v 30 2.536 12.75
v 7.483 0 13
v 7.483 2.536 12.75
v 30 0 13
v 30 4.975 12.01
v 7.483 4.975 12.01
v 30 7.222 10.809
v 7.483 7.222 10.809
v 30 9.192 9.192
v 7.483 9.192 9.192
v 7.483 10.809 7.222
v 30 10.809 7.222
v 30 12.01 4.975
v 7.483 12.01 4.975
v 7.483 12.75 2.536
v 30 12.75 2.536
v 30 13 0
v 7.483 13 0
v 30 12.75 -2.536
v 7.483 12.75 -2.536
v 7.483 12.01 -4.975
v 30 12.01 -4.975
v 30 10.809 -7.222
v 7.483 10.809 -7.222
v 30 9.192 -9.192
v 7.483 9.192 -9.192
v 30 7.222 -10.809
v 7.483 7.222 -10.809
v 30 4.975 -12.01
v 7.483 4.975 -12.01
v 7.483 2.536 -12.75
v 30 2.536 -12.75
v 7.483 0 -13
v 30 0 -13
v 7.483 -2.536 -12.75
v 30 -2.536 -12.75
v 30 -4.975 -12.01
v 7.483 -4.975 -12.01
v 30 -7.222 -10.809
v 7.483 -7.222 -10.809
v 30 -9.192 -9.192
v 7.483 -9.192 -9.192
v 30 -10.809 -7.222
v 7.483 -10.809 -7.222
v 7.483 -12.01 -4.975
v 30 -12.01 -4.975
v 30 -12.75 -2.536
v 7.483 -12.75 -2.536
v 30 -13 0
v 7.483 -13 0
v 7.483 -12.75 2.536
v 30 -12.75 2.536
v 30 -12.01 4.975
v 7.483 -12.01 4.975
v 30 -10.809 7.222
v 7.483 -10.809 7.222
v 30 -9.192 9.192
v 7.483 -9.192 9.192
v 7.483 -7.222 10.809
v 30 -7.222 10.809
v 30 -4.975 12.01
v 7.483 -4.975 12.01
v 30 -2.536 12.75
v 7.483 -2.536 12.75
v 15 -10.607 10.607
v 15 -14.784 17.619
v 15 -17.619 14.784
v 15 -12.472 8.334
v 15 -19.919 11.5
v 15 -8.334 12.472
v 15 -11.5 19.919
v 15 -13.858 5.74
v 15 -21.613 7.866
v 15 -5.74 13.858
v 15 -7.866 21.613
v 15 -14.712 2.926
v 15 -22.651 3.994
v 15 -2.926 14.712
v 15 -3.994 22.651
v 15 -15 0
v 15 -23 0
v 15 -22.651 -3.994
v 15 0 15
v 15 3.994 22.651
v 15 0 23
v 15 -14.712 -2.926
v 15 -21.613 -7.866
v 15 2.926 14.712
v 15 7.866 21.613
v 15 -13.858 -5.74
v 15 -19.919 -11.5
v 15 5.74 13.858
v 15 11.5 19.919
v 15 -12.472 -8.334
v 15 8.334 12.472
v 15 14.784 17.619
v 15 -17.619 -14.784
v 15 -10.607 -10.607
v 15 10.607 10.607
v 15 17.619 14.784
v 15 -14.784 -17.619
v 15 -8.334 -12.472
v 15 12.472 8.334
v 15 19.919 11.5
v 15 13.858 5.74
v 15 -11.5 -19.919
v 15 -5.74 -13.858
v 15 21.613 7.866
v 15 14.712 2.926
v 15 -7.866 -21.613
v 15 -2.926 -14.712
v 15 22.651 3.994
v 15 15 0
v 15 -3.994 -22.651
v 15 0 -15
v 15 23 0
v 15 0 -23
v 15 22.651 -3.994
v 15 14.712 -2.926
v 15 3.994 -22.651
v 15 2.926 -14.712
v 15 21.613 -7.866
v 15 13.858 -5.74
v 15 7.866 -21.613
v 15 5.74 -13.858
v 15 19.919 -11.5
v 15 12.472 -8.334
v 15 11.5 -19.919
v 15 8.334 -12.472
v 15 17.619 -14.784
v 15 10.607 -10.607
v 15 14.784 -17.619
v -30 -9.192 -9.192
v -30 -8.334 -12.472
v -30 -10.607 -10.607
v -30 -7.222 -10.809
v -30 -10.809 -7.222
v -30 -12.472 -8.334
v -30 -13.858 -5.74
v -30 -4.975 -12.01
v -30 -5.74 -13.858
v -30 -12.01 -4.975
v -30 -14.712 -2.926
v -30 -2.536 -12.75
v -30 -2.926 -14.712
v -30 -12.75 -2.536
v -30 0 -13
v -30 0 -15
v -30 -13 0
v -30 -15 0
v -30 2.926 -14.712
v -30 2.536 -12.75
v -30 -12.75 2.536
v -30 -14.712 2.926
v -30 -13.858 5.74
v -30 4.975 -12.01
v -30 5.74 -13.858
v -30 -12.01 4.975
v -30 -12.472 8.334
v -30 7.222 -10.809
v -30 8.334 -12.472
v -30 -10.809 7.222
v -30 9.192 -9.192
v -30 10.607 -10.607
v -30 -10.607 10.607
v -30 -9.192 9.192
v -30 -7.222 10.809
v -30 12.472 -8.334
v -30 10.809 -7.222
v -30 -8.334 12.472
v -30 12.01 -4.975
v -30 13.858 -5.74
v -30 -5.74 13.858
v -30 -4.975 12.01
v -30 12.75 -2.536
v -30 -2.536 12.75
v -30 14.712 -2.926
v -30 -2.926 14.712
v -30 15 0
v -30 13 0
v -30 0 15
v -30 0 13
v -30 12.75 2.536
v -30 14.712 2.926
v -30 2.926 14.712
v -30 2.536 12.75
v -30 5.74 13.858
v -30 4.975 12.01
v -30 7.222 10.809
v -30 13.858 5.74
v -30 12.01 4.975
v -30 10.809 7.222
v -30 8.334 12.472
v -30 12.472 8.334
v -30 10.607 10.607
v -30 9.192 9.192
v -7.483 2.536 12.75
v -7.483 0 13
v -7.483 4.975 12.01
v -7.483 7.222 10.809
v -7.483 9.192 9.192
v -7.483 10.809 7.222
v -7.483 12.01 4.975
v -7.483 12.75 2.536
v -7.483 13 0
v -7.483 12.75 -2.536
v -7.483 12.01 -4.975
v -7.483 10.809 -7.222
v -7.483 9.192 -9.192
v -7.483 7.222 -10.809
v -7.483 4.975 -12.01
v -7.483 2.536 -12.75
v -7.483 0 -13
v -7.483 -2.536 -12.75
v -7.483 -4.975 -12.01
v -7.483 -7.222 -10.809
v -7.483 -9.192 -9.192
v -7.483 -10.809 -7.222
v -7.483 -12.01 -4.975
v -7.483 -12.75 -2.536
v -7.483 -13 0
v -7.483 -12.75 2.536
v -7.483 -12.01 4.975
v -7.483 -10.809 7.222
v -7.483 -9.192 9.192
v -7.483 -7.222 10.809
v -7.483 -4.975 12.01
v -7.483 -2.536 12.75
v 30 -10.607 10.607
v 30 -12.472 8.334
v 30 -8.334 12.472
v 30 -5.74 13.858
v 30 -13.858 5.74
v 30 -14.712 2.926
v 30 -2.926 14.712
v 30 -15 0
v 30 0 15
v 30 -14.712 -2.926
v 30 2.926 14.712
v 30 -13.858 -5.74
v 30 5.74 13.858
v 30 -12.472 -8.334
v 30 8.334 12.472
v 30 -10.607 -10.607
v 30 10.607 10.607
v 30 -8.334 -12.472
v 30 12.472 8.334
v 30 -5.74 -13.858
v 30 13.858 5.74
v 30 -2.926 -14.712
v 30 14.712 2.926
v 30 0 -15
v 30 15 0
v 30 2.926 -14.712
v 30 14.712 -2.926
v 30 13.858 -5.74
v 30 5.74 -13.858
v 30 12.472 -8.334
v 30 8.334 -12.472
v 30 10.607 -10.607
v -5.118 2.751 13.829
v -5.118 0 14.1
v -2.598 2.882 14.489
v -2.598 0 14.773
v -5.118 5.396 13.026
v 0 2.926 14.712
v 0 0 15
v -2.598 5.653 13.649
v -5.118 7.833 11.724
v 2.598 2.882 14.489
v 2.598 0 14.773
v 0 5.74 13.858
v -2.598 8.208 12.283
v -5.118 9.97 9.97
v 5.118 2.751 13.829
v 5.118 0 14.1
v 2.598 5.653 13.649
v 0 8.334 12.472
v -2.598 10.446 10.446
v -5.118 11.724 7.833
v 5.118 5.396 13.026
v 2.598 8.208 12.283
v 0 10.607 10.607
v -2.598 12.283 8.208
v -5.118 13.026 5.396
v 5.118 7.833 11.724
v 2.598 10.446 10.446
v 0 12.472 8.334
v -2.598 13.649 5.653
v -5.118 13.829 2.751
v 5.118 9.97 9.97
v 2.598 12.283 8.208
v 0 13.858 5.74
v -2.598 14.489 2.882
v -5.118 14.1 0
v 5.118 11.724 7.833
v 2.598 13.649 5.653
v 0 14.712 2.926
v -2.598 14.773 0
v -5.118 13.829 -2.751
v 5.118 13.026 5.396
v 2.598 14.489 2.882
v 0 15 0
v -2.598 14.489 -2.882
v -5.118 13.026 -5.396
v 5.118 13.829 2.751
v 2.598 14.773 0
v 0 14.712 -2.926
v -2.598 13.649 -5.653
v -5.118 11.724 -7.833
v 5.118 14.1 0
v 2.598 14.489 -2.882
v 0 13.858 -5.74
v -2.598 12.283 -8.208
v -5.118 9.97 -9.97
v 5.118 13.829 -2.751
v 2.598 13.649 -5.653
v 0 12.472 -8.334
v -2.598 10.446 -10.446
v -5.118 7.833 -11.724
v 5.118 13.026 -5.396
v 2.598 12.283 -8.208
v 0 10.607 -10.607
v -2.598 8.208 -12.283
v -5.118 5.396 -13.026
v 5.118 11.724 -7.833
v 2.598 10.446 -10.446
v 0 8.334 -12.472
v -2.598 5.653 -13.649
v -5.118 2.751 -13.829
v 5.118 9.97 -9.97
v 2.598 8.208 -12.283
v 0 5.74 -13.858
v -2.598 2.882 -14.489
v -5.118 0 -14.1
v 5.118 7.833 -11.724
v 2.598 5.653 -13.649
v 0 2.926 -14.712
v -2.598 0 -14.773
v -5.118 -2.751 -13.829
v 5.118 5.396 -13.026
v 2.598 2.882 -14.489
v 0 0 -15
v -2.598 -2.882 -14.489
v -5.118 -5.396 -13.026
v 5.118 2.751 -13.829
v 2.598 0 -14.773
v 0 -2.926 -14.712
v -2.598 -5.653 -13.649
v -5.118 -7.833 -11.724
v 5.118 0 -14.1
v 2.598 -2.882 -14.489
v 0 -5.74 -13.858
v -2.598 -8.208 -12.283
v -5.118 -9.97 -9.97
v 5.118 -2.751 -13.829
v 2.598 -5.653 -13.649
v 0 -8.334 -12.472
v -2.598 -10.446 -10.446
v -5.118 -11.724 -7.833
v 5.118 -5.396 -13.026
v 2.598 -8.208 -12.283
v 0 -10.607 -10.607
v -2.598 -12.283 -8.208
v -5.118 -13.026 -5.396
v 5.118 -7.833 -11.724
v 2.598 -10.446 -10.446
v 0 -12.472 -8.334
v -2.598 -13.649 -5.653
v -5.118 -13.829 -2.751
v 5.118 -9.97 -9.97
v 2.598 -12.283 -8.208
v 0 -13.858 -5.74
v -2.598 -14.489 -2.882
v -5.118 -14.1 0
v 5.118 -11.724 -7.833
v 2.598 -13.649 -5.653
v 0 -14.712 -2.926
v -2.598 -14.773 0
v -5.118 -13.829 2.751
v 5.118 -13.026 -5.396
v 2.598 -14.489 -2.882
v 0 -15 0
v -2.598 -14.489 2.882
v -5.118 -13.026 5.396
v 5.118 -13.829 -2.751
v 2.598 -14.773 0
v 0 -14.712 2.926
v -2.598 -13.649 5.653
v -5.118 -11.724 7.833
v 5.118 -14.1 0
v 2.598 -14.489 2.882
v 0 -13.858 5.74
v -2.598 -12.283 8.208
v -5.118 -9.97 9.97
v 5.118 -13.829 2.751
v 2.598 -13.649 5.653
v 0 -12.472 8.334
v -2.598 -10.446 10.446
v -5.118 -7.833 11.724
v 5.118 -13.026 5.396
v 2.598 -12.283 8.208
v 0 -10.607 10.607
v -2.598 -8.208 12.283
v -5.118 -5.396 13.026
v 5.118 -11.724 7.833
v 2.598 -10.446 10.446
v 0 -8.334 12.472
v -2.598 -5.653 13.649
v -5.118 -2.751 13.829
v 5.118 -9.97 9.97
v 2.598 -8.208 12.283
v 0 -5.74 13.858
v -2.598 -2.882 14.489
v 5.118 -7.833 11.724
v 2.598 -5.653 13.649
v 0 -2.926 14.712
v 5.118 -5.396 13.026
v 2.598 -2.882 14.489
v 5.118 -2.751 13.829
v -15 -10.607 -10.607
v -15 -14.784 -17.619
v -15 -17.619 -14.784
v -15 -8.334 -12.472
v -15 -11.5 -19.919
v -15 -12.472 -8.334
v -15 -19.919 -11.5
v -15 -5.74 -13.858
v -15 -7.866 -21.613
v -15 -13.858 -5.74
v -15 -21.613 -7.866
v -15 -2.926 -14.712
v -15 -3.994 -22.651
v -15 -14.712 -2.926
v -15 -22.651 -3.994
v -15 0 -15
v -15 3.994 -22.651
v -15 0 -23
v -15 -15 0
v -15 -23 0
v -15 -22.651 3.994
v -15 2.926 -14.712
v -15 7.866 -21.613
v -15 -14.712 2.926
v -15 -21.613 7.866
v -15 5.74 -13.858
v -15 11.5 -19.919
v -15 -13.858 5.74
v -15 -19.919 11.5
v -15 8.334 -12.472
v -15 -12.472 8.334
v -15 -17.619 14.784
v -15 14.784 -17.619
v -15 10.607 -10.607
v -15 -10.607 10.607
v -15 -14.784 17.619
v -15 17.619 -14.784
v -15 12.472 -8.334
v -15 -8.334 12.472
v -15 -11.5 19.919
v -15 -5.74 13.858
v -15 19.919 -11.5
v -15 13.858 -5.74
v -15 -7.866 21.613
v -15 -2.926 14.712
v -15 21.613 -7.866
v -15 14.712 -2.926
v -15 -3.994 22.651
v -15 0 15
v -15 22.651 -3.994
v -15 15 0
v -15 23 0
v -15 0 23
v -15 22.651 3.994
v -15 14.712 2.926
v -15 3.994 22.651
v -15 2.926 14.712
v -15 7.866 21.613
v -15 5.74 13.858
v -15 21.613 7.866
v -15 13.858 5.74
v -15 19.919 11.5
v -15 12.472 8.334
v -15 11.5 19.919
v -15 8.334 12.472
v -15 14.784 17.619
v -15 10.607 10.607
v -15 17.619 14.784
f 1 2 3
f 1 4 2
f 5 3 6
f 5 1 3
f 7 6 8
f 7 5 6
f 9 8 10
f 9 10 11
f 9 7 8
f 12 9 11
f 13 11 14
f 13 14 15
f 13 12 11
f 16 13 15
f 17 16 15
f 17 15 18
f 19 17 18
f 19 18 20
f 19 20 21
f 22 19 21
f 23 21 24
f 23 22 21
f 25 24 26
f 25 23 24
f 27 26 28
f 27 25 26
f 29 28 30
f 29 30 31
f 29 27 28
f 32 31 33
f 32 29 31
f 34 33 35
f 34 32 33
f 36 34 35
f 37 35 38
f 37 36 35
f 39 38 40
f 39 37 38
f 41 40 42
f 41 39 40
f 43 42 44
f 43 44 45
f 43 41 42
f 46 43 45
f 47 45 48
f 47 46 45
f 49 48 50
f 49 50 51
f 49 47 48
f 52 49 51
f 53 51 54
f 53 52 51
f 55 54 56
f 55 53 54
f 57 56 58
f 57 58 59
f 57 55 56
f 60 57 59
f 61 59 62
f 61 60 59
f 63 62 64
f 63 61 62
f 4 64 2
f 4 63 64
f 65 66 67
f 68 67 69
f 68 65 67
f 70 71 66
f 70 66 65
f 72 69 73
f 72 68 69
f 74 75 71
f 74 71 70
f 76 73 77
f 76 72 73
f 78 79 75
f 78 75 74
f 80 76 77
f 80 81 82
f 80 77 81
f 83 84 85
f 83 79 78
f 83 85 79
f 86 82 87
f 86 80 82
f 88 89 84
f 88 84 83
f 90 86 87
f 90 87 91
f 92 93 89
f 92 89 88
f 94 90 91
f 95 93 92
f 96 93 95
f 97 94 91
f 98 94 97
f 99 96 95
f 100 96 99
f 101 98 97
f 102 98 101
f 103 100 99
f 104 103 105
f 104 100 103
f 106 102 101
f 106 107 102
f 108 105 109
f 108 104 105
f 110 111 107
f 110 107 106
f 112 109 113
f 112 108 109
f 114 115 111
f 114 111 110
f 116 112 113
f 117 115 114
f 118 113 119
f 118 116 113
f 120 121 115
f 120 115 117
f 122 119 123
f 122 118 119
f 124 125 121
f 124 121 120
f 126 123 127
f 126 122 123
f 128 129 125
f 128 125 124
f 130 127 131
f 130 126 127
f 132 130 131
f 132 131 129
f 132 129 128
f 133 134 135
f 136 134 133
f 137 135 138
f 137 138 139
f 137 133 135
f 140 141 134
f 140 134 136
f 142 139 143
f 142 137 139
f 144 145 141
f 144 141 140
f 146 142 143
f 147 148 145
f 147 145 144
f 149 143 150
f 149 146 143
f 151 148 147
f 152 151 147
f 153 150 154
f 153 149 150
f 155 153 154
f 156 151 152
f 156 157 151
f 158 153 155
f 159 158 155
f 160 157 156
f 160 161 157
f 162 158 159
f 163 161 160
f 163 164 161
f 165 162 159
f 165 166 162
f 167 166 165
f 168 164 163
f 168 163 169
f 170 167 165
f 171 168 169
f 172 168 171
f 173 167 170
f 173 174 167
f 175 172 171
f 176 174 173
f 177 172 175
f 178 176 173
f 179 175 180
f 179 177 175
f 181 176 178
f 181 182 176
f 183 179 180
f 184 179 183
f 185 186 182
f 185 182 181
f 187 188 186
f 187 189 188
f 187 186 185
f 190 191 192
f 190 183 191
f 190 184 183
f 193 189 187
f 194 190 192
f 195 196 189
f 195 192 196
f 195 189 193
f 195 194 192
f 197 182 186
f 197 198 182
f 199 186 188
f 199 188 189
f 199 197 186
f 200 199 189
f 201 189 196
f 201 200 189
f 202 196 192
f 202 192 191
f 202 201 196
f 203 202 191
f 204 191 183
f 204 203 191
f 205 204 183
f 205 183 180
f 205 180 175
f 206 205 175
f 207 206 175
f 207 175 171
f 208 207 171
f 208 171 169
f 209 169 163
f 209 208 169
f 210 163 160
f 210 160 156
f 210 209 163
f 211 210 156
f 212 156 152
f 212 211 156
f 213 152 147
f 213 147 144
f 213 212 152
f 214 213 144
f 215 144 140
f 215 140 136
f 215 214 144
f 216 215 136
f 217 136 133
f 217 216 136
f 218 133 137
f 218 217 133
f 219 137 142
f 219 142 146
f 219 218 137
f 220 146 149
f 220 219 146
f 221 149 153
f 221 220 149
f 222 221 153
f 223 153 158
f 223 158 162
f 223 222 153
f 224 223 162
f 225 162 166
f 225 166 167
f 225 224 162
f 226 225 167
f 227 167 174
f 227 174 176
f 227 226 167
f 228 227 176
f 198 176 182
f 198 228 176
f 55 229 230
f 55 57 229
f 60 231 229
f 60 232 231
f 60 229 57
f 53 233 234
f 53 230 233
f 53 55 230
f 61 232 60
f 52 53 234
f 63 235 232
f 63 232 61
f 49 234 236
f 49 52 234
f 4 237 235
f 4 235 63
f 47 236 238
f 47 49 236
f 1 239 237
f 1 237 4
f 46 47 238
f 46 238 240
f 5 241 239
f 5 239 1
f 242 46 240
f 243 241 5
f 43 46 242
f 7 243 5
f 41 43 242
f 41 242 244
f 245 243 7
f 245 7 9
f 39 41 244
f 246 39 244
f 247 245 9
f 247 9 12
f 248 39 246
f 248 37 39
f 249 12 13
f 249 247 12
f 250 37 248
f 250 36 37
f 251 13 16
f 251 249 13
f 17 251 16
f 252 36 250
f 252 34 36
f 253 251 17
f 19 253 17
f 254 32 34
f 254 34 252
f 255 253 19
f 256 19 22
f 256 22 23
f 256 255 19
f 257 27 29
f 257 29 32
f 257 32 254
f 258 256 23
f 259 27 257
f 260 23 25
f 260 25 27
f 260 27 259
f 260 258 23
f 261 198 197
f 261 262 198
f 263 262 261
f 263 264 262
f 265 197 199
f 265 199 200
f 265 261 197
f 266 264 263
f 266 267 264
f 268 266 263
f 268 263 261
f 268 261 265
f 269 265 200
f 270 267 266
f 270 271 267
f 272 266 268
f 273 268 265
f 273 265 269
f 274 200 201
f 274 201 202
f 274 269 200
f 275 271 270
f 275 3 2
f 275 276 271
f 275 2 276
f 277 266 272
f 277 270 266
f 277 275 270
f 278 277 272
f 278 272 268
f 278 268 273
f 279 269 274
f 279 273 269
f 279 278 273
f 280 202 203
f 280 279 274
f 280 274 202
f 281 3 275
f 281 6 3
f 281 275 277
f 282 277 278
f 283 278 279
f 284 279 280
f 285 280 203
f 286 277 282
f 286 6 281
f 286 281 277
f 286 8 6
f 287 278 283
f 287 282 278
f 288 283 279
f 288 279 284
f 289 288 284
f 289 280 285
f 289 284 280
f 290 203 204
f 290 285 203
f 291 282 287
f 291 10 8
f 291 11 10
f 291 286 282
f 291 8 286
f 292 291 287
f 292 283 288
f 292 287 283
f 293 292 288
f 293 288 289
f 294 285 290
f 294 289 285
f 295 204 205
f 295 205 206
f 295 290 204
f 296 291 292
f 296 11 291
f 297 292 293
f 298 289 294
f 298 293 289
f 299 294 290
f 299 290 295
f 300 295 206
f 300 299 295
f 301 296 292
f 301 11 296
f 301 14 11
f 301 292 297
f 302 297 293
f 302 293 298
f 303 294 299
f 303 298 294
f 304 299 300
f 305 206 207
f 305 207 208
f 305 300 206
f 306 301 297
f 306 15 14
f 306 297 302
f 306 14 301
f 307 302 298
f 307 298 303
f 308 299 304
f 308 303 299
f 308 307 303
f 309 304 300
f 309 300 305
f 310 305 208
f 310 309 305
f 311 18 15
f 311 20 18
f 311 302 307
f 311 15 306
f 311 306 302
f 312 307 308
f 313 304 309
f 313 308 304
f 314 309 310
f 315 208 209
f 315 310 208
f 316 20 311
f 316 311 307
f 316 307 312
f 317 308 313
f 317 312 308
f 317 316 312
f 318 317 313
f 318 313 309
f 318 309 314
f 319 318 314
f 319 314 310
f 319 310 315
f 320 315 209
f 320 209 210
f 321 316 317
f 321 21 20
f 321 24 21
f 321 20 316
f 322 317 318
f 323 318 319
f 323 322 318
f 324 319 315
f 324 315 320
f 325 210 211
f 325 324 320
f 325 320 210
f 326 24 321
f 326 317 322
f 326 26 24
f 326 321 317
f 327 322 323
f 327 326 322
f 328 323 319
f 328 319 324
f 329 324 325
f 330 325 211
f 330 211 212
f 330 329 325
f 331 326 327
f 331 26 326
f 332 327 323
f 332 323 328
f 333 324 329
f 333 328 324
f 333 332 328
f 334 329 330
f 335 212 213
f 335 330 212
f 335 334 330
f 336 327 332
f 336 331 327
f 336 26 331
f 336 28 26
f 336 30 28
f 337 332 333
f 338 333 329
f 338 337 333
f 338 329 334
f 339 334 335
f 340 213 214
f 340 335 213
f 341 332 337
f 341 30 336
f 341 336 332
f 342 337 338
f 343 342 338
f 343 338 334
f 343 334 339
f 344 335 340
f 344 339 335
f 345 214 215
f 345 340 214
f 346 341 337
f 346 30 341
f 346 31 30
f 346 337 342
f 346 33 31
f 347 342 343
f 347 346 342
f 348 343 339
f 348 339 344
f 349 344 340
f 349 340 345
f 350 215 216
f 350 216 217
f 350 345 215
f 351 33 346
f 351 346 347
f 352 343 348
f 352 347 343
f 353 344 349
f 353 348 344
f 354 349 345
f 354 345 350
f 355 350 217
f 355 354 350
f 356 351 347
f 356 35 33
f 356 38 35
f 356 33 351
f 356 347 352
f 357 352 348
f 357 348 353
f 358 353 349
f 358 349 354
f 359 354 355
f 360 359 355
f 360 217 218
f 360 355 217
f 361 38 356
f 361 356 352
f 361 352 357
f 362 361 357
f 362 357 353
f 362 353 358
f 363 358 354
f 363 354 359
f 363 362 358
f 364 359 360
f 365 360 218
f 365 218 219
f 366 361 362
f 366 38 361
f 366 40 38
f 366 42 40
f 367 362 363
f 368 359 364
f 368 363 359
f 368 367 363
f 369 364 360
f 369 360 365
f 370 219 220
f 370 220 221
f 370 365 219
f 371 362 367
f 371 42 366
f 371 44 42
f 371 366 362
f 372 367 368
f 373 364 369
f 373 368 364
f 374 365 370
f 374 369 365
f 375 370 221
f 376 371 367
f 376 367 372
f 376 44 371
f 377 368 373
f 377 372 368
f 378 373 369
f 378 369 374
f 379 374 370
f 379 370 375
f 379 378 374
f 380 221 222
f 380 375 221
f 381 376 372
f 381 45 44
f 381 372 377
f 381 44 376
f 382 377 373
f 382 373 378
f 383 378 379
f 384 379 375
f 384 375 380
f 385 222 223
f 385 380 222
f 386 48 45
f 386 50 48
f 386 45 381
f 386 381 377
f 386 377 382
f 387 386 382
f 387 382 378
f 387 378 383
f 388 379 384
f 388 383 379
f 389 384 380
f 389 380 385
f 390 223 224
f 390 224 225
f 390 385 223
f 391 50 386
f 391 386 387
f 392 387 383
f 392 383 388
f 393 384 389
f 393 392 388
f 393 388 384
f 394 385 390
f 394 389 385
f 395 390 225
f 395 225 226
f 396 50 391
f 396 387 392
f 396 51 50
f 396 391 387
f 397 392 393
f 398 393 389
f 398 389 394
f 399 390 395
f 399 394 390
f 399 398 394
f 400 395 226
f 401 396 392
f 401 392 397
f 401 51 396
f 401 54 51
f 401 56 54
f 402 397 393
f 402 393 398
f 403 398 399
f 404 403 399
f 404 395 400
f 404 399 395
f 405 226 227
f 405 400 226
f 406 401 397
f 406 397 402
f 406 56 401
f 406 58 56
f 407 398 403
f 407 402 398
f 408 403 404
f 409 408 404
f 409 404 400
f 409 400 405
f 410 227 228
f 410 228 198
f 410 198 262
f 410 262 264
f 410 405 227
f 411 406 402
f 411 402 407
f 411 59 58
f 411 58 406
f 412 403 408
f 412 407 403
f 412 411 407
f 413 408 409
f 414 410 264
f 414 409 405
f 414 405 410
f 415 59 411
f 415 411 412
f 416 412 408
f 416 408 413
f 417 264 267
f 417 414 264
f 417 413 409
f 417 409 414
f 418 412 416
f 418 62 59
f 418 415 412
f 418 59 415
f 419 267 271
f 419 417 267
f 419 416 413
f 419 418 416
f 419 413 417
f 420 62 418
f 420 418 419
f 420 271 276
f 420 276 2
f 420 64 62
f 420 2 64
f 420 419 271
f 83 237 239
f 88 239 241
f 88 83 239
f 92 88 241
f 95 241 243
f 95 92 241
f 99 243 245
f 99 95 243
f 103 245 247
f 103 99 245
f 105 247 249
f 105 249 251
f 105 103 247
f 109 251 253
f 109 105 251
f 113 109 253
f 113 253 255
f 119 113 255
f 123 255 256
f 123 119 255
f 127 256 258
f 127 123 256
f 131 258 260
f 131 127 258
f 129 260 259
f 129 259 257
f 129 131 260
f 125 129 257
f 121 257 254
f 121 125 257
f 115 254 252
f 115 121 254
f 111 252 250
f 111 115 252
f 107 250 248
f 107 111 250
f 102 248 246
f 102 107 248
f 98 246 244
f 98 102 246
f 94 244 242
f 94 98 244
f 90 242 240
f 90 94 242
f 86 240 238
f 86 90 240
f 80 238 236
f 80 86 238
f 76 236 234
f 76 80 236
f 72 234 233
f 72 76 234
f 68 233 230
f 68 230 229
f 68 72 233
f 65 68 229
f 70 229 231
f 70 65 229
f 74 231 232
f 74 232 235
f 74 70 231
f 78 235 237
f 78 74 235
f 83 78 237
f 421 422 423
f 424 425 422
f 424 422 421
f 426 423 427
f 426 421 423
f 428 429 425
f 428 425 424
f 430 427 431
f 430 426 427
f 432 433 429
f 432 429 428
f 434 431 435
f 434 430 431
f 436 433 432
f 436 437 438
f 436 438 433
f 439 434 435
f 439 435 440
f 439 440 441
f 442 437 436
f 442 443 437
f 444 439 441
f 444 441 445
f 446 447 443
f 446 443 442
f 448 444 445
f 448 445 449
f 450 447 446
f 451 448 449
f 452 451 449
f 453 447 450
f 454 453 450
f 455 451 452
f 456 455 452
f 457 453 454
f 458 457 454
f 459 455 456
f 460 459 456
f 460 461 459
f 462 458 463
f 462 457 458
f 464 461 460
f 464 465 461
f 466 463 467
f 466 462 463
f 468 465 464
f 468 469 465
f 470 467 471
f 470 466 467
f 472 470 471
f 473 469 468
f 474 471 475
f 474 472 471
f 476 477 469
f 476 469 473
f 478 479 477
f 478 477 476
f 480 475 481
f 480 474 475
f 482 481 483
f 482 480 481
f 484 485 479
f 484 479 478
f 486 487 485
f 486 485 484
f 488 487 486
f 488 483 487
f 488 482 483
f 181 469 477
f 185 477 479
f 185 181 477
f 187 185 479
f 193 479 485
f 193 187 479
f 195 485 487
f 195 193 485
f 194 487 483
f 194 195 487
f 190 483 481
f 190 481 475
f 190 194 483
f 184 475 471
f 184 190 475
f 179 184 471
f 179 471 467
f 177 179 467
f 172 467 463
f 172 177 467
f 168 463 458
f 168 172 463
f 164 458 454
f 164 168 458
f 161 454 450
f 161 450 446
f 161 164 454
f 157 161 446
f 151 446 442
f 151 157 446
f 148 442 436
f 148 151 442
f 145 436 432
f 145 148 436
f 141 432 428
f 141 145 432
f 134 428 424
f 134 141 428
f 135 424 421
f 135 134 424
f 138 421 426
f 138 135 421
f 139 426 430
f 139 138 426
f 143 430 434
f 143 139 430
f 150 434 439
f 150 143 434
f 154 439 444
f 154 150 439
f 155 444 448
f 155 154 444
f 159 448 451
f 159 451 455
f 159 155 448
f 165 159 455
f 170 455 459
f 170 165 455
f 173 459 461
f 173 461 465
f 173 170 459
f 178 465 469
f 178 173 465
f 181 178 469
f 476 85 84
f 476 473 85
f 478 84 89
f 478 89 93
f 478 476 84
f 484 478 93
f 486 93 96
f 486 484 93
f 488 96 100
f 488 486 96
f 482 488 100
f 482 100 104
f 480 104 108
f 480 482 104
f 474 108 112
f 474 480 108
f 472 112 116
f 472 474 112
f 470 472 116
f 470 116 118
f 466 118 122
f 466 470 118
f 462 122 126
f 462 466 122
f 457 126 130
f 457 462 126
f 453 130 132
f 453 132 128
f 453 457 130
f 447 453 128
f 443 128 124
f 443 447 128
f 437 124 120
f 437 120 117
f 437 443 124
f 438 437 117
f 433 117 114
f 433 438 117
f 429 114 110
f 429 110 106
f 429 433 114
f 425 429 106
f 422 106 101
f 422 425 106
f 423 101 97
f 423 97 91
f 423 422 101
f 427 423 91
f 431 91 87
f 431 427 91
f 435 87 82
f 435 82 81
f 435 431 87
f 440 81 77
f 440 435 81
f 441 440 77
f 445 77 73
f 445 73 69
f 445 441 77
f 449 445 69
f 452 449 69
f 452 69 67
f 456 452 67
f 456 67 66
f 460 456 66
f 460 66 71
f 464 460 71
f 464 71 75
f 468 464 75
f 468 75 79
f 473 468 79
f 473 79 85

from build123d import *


with BuildPart() as f1:
    # F0 (on Front) → F1 (revolve)
    with BuildSketch(Plane.XZ):
        with BuildLine():
            Line((-30, 13), (-7.483315, 13))
            ThreePointArc((-7.483315, 13), (0, 15), (7.483315, 13))
            Line((7.483315, 13), (30, 13))
            Line((30, 13), (30, 15))
            Line((30, 15), (15, 15))
            Line((15, 15), (15, 23))
            Line((15, 23), (-15, 23))
            Line((-15, 23), (-15, 15))
            Line((-15, 15), (-30, 15))
            Line((-30, 15), (-30, 13))
        make_face()
    revolve(axis=Axis((-26.536044, 0, 0), (-1, 0, 0)))


solid = f1.part
